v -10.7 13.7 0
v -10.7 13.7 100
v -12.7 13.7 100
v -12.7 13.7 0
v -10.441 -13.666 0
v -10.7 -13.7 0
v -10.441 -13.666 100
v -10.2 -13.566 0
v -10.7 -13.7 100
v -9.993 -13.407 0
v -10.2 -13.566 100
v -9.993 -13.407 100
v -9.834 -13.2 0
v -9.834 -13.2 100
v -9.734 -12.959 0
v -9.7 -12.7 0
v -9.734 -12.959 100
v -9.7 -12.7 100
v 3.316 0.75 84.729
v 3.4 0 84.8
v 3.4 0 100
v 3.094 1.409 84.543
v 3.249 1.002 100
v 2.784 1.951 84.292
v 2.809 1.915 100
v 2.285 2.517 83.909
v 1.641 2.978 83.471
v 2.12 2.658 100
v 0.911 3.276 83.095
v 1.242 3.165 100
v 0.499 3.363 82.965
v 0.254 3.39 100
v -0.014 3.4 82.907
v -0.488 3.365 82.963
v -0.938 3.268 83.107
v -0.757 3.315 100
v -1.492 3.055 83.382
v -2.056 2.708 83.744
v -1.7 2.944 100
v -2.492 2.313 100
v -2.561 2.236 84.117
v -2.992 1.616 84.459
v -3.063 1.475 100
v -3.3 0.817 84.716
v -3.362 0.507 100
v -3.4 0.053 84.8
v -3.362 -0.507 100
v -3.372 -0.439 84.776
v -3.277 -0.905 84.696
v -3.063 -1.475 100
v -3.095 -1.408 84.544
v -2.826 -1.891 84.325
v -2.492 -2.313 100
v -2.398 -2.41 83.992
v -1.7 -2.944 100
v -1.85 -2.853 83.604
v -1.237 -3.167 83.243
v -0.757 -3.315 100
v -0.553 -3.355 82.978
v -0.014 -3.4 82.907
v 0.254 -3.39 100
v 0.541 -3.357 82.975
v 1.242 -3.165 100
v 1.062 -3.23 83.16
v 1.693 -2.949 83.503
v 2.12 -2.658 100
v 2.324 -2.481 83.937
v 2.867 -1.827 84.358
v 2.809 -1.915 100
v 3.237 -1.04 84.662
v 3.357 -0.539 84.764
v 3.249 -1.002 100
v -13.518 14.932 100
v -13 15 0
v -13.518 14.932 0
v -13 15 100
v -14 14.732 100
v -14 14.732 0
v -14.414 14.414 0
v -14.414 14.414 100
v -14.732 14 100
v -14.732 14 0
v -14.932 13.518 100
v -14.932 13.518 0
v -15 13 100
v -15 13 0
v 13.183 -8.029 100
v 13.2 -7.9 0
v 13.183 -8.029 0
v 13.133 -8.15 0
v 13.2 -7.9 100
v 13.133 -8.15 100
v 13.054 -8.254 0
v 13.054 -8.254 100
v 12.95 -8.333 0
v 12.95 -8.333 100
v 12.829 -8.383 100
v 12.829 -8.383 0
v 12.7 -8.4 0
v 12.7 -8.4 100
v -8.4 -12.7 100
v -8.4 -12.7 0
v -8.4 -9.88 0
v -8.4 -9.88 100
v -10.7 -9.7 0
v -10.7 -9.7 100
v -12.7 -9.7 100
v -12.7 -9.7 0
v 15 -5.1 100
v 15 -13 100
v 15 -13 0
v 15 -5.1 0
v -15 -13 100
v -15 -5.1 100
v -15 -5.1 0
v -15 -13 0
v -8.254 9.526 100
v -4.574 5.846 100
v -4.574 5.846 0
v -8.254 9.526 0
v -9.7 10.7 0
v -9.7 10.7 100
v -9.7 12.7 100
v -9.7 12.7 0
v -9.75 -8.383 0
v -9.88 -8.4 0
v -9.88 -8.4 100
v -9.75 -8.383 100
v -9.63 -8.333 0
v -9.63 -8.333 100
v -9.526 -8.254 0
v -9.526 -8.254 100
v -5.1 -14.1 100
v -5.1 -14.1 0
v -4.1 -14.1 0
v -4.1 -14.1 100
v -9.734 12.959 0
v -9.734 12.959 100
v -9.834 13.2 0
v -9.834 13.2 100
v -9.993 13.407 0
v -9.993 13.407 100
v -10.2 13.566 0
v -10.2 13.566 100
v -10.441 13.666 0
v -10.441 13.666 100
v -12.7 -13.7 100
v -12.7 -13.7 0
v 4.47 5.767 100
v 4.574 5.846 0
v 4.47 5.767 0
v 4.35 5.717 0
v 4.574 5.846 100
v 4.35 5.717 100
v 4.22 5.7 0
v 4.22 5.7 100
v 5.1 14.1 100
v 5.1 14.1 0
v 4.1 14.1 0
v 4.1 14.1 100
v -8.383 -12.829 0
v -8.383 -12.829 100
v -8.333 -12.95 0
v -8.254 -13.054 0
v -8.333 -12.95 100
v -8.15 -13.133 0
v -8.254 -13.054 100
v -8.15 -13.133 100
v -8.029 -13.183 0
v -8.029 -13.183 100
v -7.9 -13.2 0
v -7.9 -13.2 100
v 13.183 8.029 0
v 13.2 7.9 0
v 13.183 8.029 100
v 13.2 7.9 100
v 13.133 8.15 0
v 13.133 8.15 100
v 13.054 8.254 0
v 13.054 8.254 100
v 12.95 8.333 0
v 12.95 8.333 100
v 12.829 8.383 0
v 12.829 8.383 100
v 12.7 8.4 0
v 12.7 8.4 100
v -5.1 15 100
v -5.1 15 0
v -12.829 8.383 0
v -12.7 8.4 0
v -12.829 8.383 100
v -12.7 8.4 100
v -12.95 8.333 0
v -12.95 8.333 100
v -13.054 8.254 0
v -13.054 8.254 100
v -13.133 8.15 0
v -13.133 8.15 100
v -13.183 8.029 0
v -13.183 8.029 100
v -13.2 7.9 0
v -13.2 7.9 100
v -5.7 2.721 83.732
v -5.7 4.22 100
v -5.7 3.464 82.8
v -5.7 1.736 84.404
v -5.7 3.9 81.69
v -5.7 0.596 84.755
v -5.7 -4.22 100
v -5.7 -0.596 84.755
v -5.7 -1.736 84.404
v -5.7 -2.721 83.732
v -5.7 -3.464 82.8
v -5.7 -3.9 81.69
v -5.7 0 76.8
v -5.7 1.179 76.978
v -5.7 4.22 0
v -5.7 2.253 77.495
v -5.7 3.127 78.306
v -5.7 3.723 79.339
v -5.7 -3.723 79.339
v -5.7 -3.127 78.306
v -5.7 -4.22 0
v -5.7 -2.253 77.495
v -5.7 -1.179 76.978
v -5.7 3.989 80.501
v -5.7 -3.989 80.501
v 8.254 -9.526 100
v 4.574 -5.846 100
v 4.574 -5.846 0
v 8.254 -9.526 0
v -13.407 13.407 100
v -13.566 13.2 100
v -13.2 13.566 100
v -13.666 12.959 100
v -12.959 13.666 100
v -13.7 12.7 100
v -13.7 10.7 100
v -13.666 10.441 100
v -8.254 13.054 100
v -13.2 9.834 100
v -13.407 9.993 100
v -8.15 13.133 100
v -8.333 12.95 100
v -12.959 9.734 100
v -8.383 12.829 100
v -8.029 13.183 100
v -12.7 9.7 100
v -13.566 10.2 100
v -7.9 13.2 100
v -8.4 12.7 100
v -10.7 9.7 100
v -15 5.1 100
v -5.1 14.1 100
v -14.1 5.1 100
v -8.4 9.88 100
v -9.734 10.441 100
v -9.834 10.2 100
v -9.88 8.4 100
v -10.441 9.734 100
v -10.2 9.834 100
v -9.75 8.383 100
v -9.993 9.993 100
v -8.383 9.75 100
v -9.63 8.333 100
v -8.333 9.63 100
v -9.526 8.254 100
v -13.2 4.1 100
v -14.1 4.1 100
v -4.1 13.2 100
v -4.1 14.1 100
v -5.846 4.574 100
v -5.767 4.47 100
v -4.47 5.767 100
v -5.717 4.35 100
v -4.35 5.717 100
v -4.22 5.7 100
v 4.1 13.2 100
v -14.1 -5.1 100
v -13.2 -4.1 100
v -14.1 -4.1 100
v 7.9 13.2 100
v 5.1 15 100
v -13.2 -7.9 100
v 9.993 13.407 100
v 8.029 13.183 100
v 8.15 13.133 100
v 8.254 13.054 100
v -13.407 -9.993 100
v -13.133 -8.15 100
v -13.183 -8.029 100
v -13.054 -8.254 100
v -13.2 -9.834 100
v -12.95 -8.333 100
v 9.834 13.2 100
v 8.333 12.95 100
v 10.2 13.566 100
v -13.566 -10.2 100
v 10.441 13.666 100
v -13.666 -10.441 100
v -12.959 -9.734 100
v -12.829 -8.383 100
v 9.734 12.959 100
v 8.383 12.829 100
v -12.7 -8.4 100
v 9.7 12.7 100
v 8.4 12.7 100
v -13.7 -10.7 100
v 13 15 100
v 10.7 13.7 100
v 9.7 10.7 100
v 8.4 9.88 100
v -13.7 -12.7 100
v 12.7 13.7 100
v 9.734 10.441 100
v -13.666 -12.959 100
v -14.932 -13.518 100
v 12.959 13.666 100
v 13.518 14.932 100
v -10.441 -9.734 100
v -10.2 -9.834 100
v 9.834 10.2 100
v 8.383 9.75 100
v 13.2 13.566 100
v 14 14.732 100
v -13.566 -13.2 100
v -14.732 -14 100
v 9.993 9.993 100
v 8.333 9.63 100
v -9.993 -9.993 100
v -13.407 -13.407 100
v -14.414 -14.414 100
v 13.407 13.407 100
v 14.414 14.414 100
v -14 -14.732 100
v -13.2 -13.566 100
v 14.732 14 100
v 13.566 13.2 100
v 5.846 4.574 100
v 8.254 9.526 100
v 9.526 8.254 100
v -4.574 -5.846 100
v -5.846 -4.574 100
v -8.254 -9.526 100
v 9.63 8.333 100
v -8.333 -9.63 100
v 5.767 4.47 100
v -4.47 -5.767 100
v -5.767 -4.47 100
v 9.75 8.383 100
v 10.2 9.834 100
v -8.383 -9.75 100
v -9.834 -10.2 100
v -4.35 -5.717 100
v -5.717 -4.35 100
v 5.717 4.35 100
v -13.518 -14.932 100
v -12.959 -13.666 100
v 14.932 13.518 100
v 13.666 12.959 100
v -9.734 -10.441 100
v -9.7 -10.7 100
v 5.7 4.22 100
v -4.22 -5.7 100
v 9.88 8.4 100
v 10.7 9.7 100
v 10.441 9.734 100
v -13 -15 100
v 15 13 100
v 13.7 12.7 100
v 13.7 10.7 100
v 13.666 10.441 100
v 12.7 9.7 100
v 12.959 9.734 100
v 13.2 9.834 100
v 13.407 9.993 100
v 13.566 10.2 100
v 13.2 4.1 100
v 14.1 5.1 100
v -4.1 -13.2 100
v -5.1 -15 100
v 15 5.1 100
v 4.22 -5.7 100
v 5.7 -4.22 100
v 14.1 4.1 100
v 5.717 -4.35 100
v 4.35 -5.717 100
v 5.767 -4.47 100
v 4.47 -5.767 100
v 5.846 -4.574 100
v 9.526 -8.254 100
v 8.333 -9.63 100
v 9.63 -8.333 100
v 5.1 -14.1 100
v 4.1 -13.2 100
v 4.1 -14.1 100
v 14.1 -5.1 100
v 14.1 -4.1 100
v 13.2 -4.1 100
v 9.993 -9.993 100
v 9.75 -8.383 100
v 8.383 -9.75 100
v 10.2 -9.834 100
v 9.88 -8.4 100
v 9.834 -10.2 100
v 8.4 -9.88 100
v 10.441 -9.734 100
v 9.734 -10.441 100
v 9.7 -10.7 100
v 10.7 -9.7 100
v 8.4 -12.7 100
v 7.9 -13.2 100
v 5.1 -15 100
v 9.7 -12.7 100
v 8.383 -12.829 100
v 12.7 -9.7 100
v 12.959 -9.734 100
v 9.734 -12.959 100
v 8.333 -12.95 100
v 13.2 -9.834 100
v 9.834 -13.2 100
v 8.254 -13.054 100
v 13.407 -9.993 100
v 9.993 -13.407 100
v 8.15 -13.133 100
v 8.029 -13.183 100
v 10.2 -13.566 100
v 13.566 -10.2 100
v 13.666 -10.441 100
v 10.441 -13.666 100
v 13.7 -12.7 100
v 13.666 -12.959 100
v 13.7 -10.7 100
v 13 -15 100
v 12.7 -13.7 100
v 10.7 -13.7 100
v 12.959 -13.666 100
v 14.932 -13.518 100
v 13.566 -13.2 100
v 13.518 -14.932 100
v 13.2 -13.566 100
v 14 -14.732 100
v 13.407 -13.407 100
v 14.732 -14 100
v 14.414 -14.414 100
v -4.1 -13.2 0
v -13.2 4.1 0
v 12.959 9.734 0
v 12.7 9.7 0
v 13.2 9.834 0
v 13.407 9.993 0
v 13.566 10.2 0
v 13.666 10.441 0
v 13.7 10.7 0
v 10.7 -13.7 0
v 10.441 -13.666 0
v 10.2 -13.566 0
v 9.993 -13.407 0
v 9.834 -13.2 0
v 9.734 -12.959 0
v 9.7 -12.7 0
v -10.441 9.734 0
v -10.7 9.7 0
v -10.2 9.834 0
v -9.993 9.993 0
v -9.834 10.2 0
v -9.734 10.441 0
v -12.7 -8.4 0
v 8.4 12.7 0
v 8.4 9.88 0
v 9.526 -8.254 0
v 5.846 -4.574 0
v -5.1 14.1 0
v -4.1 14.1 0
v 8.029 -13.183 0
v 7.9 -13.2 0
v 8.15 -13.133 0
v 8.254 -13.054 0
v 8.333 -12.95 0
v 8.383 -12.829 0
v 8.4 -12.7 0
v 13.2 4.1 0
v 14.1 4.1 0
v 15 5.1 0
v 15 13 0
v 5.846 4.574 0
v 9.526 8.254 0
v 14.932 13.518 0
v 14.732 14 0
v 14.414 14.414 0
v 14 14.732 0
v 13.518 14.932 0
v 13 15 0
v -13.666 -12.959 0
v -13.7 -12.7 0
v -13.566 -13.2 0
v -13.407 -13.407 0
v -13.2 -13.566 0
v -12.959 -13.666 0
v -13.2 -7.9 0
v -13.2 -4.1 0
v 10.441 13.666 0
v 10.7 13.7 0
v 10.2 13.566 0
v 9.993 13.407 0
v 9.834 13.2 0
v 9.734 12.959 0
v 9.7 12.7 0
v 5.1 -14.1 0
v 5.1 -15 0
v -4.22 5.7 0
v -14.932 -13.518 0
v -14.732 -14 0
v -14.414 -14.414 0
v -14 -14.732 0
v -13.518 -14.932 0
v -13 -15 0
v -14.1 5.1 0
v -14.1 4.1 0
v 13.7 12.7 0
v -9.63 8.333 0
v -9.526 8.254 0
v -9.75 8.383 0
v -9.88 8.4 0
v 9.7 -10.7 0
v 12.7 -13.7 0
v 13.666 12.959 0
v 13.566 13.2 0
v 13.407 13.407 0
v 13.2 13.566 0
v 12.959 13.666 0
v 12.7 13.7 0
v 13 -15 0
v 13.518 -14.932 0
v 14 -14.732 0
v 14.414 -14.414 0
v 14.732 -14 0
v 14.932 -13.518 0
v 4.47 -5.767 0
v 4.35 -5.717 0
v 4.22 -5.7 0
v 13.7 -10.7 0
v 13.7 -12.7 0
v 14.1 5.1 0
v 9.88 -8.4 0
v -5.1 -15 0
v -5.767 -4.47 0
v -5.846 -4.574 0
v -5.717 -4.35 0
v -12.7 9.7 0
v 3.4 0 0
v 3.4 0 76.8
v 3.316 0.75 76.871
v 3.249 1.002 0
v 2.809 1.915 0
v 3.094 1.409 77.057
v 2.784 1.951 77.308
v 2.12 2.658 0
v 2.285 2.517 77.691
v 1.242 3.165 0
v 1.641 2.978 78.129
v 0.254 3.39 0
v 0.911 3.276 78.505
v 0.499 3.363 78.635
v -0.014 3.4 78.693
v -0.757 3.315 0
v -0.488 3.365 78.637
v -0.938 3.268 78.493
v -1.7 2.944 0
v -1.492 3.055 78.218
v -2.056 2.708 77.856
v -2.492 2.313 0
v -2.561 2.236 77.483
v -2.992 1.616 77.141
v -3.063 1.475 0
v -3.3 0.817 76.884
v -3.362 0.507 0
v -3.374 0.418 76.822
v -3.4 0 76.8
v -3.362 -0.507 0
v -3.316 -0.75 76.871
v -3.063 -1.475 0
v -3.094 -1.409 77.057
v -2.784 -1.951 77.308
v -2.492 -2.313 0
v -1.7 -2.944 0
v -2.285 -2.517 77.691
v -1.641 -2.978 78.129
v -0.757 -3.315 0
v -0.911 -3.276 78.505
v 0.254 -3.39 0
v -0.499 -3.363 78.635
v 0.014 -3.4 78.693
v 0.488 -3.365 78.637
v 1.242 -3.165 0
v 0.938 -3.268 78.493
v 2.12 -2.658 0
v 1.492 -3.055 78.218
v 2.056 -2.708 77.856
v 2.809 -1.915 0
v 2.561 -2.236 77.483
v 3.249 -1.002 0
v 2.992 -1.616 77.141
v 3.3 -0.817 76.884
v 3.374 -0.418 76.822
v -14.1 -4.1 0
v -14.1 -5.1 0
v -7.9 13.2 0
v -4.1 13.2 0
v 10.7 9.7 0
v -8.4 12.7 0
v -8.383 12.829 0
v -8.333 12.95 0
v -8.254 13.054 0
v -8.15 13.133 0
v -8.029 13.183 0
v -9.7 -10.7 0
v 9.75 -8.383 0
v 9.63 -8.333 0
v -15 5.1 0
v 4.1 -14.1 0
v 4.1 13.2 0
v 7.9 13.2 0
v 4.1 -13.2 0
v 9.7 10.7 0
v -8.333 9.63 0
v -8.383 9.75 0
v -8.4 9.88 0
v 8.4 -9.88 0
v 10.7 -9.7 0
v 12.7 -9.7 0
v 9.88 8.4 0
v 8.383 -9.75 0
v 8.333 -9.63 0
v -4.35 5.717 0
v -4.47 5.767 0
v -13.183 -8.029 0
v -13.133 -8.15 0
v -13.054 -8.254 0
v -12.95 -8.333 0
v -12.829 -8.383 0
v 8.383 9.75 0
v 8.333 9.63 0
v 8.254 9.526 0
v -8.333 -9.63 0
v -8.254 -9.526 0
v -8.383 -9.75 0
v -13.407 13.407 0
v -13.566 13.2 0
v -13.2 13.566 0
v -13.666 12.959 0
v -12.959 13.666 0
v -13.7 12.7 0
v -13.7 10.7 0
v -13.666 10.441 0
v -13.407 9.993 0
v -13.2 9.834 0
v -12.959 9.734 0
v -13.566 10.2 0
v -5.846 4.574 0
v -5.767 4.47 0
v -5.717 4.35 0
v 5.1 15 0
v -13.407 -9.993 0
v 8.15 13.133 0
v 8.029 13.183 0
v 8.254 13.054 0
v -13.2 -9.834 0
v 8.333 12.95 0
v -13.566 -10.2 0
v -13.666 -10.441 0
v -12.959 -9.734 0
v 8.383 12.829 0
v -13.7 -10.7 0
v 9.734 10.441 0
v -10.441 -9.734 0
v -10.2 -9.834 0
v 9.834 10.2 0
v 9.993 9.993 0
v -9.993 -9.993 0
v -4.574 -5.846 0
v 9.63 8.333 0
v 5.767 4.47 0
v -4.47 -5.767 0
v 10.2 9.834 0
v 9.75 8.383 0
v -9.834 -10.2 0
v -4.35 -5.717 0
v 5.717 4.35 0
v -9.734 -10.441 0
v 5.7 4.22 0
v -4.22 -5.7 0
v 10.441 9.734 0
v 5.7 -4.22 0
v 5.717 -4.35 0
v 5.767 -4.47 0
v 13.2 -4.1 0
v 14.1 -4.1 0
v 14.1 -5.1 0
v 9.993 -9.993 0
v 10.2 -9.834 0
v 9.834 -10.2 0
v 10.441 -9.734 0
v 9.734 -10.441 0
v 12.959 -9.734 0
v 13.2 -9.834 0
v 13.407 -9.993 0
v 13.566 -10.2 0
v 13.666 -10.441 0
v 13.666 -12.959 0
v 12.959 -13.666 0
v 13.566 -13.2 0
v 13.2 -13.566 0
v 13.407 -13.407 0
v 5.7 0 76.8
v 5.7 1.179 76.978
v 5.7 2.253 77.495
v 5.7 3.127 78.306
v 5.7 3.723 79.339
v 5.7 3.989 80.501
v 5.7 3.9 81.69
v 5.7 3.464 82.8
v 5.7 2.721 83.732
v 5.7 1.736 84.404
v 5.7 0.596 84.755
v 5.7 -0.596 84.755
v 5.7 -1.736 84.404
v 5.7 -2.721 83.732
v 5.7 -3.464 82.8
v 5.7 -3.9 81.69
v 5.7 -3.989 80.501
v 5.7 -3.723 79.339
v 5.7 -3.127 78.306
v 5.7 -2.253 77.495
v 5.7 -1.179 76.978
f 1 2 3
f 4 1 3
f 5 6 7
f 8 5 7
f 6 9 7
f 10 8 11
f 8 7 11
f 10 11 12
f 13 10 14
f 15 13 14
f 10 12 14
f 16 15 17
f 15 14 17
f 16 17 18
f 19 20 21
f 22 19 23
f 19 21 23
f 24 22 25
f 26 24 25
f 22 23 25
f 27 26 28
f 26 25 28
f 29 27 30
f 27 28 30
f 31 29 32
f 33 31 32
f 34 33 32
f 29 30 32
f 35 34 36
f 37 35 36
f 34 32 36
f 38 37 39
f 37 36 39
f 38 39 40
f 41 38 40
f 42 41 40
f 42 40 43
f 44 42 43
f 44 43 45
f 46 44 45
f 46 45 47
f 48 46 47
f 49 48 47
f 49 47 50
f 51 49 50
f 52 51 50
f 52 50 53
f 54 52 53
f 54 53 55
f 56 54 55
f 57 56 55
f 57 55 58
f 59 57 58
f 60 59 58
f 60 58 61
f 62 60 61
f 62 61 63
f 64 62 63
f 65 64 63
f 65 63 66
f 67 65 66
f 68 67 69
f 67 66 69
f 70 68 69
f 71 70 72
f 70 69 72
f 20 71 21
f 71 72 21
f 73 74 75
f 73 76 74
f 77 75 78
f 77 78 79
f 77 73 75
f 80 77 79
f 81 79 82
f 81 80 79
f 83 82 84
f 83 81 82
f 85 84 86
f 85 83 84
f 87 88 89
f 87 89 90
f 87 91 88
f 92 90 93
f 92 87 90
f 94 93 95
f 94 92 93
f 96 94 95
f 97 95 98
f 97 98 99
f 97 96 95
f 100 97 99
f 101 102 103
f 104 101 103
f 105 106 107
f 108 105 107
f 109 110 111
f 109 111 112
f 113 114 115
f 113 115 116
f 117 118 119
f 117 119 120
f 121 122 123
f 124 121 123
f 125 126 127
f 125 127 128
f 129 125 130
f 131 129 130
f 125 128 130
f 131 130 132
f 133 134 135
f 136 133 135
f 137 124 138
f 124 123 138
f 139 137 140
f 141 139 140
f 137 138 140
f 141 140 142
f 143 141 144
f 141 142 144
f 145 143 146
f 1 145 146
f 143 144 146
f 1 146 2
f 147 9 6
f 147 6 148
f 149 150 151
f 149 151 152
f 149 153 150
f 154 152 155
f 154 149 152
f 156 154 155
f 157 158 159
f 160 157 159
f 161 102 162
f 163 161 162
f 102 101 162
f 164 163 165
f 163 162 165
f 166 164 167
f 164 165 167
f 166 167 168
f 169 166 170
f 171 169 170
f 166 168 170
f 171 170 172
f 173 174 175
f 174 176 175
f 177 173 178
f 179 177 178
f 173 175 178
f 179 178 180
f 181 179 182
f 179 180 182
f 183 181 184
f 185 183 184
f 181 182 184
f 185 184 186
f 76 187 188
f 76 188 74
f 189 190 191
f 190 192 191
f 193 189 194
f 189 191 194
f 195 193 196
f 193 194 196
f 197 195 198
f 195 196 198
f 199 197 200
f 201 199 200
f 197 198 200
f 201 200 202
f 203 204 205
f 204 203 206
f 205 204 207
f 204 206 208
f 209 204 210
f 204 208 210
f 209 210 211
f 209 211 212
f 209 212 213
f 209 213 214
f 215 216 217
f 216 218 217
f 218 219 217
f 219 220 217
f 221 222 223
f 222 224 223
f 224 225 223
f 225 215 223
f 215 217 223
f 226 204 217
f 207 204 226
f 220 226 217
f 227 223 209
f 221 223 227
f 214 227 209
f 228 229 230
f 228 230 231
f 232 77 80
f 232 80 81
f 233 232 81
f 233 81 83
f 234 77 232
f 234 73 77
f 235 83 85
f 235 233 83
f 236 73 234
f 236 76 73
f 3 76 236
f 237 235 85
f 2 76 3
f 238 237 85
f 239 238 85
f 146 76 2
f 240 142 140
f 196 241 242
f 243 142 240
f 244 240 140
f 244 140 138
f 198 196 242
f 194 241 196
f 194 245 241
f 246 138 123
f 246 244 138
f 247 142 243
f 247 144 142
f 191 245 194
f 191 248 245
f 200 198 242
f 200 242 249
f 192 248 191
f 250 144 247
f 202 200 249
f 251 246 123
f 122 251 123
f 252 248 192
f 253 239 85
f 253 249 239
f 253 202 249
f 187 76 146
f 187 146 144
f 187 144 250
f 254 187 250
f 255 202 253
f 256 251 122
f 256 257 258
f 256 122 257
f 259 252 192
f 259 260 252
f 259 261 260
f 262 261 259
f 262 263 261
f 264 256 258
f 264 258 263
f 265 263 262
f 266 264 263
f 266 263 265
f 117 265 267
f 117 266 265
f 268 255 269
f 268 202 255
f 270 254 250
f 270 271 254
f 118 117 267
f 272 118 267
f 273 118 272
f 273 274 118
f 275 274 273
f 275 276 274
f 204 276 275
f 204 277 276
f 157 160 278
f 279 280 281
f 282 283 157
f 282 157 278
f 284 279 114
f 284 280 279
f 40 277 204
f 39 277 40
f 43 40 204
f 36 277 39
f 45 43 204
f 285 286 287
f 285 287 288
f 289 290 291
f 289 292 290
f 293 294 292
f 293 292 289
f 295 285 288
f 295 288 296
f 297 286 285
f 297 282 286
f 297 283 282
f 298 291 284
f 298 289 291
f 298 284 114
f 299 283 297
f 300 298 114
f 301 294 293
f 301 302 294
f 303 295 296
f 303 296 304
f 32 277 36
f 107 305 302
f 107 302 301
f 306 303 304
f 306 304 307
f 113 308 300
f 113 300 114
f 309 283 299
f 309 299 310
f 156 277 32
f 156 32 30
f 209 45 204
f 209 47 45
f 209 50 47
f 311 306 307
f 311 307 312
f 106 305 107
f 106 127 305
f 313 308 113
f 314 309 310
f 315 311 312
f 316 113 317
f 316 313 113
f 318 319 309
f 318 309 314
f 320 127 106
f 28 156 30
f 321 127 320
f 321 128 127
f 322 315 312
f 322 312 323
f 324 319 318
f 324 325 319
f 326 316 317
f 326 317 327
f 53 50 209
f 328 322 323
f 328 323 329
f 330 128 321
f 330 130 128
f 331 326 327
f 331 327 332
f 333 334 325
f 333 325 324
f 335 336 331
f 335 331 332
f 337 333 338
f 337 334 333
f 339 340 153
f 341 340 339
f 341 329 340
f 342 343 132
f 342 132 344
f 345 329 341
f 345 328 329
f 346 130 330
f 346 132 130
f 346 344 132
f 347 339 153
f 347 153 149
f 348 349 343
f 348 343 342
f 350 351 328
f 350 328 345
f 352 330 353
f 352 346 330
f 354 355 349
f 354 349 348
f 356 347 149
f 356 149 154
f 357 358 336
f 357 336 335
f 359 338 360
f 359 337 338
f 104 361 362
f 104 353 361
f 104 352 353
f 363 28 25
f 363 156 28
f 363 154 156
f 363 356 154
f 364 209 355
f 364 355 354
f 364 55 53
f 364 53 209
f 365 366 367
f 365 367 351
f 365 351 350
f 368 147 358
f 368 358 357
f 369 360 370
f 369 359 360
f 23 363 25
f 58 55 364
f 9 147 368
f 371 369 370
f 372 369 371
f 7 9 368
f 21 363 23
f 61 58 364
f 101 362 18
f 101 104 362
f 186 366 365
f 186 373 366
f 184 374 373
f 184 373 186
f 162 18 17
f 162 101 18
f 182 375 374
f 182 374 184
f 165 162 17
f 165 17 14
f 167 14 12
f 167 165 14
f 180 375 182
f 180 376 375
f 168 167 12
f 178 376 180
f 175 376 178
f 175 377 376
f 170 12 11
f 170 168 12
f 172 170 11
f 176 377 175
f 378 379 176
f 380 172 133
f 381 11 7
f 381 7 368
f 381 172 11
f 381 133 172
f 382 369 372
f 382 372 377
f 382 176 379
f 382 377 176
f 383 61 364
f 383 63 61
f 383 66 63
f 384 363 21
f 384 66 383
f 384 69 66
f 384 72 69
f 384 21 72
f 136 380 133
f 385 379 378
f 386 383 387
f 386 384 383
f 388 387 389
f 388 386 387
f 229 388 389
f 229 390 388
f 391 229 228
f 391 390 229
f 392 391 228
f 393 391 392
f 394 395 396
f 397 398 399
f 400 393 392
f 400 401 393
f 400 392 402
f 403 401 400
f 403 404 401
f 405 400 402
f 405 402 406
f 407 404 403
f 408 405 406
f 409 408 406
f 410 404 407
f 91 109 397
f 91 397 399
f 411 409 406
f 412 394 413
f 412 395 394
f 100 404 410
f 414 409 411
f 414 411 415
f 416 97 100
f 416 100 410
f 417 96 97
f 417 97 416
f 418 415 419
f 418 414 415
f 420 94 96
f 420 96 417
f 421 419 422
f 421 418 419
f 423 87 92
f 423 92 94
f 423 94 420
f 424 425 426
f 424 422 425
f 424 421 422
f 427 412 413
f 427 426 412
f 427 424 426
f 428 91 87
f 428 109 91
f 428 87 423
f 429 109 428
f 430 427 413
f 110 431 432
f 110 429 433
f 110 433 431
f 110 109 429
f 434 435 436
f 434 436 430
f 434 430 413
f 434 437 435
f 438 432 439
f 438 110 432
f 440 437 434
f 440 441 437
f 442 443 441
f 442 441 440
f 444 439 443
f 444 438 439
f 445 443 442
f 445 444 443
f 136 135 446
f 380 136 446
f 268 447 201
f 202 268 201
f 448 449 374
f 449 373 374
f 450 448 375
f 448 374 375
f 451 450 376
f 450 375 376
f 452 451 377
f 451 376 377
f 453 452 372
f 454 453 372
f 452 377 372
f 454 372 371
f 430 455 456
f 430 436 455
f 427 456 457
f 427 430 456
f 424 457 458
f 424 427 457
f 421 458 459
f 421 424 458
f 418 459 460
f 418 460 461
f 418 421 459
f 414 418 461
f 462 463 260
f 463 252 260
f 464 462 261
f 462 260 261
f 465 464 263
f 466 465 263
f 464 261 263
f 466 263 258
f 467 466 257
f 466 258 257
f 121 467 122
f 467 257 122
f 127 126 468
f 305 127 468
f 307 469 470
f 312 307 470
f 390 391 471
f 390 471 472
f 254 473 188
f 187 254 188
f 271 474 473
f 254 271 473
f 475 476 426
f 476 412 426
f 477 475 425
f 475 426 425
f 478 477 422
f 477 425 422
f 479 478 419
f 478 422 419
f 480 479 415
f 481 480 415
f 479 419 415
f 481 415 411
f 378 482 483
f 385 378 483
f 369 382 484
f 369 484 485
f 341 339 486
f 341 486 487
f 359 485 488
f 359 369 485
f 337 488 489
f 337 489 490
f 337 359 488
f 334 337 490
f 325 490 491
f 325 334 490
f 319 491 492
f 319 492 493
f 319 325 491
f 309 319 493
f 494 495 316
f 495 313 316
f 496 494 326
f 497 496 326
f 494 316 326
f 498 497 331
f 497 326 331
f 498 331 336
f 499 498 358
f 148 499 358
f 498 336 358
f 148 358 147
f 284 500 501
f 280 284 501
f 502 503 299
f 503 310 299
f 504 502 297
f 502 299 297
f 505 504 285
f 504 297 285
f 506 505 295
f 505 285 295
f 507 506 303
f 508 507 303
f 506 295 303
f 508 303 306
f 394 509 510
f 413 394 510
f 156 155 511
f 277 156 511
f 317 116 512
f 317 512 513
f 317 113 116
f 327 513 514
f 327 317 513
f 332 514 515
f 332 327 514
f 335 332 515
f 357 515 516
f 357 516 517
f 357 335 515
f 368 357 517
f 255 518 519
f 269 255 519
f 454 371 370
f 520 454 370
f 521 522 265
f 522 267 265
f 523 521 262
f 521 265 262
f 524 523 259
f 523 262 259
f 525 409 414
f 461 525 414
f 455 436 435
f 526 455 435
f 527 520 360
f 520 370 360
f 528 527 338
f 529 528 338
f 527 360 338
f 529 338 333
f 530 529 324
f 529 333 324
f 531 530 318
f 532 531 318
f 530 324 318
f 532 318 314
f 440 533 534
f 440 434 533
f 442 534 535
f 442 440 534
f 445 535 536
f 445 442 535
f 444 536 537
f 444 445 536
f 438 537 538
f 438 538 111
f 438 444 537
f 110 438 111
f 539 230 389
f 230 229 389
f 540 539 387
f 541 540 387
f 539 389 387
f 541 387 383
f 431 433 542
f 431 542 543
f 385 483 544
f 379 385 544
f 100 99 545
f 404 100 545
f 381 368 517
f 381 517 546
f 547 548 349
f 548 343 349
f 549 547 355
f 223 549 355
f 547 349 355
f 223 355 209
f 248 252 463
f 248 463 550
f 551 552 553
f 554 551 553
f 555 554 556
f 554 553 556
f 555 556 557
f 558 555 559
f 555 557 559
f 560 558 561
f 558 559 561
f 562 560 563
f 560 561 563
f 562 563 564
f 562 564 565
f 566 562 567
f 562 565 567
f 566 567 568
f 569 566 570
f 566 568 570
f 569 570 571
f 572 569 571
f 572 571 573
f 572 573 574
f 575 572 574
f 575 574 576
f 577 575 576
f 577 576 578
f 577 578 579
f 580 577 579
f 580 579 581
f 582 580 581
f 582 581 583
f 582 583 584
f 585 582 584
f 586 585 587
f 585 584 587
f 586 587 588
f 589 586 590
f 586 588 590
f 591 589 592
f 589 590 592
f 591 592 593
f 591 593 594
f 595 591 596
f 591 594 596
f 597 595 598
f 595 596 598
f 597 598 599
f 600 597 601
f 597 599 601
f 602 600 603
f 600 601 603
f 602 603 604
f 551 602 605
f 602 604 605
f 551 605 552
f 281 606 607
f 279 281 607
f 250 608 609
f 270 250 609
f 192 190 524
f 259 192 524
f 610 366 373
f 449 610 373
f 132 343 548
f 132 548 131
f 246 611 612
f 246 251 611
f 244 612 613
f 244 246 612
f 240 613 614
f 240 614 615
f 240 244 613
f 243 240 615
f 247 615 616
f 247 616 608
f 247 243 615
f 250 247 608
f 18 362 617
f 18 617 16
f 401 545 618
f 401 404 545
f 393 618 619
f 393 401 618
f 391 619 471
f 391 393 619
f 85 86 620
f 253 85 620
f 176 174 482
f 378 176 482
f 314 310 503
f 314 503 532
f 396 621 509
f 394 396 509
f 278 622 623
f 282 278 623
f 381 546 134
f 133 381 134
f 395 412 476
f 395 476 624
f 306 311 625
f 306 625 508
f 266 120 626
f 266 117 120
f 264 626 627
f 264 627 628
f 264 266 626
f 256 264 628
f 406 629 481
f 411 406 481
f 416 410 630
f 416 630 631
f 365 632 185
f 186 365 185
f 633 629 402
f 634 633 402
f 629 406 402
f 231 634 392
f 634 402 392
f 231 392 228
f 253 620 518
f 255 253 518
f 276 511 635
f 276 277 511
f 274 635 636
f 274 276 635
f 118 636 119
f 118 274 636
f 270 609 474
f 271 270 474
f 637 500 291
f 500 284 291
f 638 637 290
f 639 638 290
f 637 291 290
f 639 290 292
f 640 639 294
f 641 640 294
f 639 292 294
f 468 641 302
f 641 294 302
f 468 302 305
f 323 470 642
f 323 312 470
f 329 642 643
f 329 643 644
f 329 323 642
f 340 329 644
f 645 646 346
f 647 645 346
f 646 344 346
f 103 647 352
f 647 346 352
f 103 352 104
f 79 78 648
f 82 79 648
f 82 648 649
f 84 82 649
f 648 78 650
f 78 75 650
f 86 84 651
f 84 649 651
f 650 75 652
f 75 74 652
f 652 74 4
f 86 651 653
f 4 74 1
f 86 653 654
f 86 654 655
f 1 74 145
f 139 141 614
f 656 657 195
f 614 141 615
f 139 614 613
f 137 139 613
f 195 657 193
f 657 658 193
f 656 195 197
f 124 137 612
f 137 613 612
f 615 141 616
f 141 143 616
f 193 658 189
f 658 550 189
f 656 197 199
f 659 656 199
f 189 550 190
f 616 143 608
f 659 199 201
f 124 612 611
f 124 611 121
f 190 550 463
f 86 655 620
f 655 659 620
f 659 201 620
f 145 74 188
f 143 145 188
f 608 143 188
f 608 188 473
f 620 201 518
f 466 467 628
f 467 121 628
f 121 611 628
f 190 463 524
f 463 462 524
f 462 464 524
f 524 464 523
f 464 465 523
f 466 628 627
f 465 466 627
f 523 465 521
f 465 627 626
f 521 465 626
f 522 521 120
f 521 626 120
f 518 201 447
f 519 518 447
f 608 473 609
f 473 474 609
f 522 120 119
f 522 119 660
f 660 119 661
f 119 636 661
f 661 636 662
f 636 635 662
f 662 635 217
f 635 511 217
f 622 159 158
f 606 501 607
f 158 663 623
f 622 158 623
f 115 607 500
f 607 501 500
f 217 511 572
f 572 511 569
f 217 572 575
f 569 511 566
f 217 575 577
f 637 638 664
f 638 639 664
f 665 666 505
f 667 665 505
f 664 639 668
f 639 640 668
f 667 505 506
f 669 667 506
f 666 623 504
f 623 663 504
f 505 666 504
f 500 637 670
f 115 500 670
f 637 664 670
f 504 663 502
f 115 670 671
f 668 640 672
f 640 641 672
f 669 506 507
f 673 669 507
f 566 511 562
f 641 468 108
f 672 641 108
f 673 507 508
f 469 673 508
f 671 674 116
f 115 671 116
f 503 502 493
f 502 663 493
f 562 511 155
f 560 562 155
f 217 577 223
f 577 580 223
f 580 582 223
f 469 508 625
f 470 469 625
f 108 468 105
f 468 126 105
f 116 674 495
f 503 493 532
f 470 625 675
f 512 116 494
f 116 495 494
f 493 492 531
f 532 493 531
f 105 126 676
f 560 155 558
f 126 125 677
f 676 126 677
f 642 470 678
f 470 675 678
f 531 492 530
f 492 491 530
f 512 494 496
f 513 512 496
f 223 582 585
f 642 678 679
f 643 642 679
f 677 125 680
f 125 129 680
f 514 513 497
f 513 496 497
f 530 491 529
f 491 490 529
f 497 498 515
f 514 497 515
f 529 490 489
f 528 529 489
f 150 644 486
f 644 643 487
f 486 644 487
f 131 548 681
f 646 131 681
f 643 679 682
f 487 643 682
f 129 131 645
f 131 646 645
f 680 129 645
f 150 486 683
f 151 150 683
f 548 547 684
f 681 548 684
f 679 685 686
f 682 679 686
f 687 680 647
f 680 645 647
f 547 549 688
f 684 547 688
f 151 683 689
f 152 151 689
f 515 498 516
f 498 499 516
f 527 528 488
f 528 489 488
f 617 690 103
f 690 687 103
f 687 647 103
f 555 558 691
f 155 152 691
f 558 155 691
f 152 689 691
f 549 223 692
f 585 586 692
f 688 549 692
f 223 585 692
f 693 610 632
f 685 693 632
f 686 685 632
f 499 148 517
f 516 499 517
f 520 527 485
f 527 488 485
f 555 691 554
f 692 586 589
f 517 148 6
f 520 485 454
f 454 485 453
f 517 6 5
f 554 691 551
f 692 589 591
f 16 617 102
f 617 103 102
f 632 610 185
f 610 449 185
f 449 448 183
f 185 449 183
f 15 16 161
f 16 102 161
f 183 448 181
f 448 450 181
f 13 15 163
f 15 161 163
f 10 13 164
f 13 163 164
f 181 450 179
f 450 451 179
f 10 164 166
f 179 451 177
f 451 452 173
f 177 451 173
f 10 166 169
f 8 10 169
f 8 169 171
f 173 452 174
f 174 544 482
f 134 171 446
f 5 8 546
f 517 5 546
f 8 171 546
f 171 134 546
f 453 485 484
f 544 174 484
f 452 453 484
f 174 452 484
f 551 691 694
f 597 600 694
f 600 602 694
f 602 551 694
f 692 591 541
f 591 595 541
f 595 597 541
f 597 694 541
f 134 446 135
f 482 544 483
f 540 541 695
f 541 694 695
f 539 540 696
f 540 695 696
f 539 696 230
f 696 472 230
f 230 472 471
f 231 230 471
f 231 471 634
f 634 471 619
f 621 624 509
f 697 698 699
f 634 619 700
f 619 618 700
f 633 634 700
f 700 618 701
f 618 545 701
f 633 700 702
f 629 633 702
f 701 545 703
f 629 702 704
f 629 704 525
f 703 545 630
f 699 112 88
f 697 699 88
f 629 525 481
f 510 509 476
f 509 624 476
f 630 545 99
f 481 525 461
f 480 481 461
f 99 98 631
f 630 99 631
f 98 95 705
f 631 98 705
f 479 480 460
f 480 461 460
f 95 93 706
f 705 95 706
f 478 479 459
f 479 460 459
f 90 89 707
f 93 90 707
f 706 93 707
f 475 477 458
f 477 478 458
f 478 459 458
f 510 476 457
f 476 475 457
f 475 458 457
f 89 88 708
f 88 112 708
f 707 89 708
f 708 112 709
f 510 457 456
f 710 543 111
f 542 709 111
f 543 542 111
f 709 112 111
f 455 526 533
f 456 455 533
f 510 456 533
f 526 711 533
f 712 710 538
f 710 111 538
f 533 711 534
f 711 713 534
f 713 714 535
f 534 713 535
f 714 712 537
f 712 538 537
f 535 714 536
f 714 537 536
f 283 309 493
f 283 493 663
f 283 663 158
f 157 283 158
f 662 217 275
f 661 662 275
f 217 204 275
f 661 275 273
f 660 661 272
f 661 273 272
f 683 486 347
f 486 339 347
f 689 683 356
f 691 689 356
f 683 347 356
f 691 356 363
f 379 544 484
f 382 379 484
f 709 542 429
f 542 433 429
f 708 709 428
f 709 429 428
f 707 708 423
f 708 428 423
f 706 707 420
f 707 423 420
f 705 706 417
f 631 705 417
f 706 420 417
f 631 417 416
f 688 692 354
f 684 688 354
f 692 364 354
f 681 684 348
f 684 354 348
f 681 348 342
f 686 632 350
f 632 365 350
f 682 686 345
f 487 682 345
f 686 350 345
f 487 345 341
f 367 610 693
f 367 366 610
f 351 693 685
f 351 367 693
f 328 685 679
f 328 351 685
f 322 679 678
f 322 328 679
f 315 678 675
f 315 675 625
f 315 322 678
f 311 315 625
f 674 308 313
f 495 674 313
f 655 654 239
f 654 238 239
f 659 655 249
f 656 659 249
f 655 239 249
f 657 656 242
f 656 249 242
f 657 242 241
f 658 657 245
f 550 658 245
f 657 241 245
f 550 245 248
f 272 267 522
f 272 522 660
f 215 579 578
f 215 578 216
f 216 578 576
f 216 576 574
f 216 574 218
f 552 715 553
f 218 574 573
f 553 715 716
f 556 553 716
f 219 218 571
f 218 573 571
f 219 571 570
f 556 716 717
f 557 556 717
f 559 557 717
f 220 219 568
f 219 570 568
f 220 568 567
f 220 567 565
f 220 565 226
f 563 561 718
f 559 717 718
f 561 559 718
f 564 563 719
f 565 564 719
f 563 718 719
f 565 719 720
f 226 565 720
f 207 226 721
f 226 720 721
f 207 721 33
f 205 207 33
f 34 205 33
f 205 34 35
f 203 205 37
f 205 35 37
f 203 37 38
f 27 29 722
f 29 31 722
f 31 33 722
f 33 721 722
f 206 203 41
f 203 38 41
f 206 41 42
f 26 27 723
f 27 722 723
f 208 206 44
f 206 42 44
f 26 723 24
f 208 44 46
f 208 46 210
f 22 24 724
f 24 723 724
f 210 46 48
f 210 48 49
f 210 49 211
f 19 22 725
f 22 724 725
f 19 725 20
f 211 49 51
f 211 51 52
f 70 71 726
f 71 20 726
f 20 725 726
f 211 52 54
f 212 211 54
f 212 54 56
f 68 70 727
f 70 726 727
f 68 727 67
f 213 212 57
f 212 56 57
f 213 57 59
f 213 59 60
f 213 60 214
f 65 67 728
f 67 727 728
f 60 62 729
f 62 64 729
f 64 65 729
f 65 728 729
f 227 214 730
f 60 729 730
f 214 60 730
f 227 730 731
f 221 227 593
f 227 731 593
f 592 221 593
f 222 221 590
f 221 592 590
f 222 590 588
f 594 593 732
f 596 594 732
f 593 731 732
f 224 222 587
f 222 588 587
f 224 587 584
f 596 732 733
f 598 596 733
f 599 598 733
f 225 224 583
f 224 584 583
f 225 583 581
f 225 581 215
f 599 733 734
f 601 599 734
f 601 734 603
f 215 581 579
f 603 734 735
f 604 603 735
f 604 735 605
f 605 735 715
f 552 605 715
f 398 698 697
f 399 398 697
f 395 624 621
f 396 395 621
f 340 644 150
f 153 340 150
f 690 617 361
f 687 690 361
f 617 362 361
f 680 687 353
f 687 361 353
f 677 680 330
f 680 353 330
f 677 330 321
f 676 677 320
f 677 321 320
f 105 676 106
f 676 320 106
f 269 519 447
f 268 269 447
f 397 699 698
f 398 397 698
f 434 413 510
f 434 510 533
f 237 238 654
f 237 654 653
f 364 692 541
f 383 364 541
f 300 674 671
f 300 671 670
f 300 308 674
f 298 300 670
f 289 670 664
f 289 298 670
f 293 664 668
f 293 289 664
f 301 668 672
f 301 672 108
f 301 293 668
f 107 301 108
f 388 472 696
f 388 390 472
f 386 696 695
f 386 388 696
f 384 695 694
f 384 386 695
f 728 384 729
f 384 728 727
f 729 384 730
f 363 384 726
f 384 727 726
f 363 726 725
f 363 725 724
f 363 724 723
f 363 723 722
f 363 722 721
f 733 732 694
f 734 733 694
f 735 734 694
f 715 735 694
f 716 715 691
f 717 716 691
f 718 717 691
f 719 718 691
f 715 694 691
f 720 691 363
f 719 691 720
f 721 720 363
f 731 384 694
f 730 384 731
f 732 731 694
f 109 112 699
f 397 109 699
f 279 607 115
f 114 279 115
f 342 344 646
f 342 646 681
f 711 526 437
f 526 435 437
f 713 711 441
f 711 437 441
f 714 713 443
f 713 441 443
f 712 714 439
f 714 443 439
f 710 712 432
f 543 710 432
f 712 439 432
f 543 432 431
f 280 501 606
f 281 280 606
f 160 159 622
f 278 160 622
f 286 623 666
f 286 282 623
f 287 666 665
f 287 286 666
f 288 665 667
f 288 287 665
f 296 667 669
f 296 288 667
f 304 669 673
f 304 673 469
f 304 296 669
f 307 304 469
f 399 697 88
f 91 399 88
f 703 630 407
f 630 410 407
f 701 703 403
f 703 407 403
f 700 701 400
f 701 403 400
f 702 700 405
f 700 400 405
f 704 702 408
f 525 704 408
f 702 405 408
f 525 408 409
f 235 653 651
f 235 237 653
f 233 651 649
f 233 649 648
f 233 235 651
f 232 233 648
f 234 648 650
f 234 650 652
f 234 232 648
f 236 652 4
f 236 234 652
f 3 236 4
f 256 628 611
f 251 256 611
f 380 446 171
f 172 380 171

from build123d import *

# Parameters (mm, degrees)
SKETCH_1_W                       = 4
SKETCH_1_H                       = 4
EXTRUDE_1_DEPTH                  = 100
FILLET_1_R                       = 1
FILLET_2_R                       = 2
FILLET_3_R                       = 0.5
PATTERN_CIRCULAR_1_COUNT         = 4
FILLET_1_OF_PATTERN_CIRCULAR_1_R = 1
FILLET_2_OF_PATTERN_CIRCULAR_1_R = 2
FILLET_3_OF_PATTERN_CIRCULAR_1_R = 0.5
SKETCH_2_R                       = 3.4
CUT_EXTRUDE_1_DEPTH              = 101
SKETCH_3_R                       = 4
CUT_EXTRUDE_2_DEPTH              = 15


with BuildPart() as part:
    # 草图1 → 凸台-拉伸1 (new body)
    with BuildSketch(Plane.XY):
        Polygon((5.7, 0), (5.7, 4.427207794), (9.672792206, 8.4), (13.2, 8.4), (13.2, 4.1), (14.1, 4.1), (14.1, 5.1), (15, 5.1), (15, 15), (5.1, 15), (5.1, 14.1), (4.1, 14.1), (4.1, 13.2), (8.4, 13.2), (8.4, 9.672792206), (4.427207794, 5.7), (0, 5.7), (0, 0), align=None)
        with Locations((11.7, 11.7)):
            Rectangle(SKETCH_1_W, SKETCH_1_H, mode=Mode.SUBTRACT)
    extrude_1 = extrude(amount=EXTRUDE_1_DEPTH)

    # 圆角1
    fillet_1_edges = [part.edges().sort_by_distance(p)[0] for p in [
        (13.7, 9.7, 50),
        (13.7, 13.7, 50),
        (9.7, 13.7, 50),
        (9.7, 9.7, 50),
    ]]
    fillet(fillet_1_edges, radius=FILLET_1_R)

    # 圆角2
    fillet_2_edges = [part.edges().sort_by_distance(p)[0] for p in [
        (15, 15, 50),
    ]]
    fillet(fillet_2_edges, radius=FILLET_2_R)

    # 圆角3
    fillet_3_edges = [part.edges().sort_by_distance(p)[0] for p in [
        (4.427207794, 5.7, 50),
        (8.4, 9.672792206, 50),
        (8.4, 13.2, 50),
        (13.2, 8.4, 50),
        (9.672792206, 8.4, 50),
        (5.7, 4.427207794, 50),
    ]]
    fillet(fillet_3_edges, radius=FILLET_3_R)

    # 阵列(圆周)1: 凸台-拉伸1 ×4 about axis
    pattern_circular_1_axis = Axis((0, 0, 0), (0, 0, 1))
    for i in range(1, PATTERN_CIRCULAR_1_COUNT):
        add(extrude_1.rotate(pattern_circular_1_axis, i * 360 / PATTERN_CIRCULAR_1_COUNT))

    # 圆角1 of 阵列(圆周)1
    fillet_1_of_pattern_circular_1_edges = [part.edges().sort_by_distance(p)[0] for p in [
        (-9.7, 13.7, 50),
        (-13.7, 13.7, 50),
        (-13.7, 9.7, 50),
        (-9.7, 9.7, 50),
        (-13.7, -9.7, 50),
        (-13.7, -13.7, 50),
        (-9.7, -13.7, 50),
        (-9.7, -9.7, 50),
        (9.7, -13.7, 50),
        (13.7, -13.7, 50),
        (13.7, -9.7, 50),
        (9.7, -9.7, 50),
    ]]
    fillet(fillet_1_of_pattern_circular_1_edges, radius=FILLET_1_OF_PATTERN_CIRCULAR_1_R)

    # 圆角2 of 阵列(圆周)1
    fillet_2_of_pattern_circular_1_edges = [part.edges().sort_by_distance(p)[0] for p in [
        (-15, 15, 50),
        (-15, -15, 50),
        (15, -15, 50),
    ]]
    fillet(fillet_2_of_pattern_circular_1_edges, radius=FILLET_2_OF_PATTERN_CIRCULAR_1_R)

    # 圆角3 of 阵列(圆周)1
    fillet_3_of_pattern_circular_1_edges = [part.edges().sort_by_distance(p)[0] for p in [
        (-5.7, 4.427207794, 50),
        (-9.672792206, 8.4, 50),
        (-13.2, 8.4, 50),
        (-8.4, 13.2, 50),
        (-8.4, 9.672792206, 50),
        (-4.427207794, 5.7, 50),
        (-4.427207794, -5.7, 50),
        (-8.4, -9.672792206, 50),
        (-8.4, -13.2, 50),
        (-13.2, -8.4, 50),
        (-9.672792206, -8.4, 50),
        (-5.7, -4.427207794, 50),
        (5.7, -4.427207794, 50),
        (9.672792206, -8.4, 50),
        (13.2, -8.4, 50),
        (8.4, -13.2, 50),
        (8.4, -9.672792206, 50),
        (4.427207794, -5.7, 50),
    ]]
    fillet(fillet_3_of_pattern_circular_1_edges, radius=FILLET_3_OF_PATTERN_CIRCULAR_1_R)

    # 草图2 → 切除-拉伸1 (cut, through all)
    with BuildSketch(Plane.XY.offset(100)):
        Circle(SKETCH_2_R)
    extrude(amount=-CUT_EXTRUDE_1_DEPTH, mode=Mode.SUBTRACT)

    # 草图3 → 切除-拉伸2 (cut, symmetric)
    with BuildSketch(Plane(origin=(0, 0, 0), x_dir=(0, 0, -1), z_dir=(1, 0, 0))):
        with Locations((-80.8, 0)):
            Circle(SKETCH_3_R)
    extrude(amount=CUT_EXTRUDE_2_DEPTH, both=True, mode=Mode.SUBTRACT)


solid = part.part
